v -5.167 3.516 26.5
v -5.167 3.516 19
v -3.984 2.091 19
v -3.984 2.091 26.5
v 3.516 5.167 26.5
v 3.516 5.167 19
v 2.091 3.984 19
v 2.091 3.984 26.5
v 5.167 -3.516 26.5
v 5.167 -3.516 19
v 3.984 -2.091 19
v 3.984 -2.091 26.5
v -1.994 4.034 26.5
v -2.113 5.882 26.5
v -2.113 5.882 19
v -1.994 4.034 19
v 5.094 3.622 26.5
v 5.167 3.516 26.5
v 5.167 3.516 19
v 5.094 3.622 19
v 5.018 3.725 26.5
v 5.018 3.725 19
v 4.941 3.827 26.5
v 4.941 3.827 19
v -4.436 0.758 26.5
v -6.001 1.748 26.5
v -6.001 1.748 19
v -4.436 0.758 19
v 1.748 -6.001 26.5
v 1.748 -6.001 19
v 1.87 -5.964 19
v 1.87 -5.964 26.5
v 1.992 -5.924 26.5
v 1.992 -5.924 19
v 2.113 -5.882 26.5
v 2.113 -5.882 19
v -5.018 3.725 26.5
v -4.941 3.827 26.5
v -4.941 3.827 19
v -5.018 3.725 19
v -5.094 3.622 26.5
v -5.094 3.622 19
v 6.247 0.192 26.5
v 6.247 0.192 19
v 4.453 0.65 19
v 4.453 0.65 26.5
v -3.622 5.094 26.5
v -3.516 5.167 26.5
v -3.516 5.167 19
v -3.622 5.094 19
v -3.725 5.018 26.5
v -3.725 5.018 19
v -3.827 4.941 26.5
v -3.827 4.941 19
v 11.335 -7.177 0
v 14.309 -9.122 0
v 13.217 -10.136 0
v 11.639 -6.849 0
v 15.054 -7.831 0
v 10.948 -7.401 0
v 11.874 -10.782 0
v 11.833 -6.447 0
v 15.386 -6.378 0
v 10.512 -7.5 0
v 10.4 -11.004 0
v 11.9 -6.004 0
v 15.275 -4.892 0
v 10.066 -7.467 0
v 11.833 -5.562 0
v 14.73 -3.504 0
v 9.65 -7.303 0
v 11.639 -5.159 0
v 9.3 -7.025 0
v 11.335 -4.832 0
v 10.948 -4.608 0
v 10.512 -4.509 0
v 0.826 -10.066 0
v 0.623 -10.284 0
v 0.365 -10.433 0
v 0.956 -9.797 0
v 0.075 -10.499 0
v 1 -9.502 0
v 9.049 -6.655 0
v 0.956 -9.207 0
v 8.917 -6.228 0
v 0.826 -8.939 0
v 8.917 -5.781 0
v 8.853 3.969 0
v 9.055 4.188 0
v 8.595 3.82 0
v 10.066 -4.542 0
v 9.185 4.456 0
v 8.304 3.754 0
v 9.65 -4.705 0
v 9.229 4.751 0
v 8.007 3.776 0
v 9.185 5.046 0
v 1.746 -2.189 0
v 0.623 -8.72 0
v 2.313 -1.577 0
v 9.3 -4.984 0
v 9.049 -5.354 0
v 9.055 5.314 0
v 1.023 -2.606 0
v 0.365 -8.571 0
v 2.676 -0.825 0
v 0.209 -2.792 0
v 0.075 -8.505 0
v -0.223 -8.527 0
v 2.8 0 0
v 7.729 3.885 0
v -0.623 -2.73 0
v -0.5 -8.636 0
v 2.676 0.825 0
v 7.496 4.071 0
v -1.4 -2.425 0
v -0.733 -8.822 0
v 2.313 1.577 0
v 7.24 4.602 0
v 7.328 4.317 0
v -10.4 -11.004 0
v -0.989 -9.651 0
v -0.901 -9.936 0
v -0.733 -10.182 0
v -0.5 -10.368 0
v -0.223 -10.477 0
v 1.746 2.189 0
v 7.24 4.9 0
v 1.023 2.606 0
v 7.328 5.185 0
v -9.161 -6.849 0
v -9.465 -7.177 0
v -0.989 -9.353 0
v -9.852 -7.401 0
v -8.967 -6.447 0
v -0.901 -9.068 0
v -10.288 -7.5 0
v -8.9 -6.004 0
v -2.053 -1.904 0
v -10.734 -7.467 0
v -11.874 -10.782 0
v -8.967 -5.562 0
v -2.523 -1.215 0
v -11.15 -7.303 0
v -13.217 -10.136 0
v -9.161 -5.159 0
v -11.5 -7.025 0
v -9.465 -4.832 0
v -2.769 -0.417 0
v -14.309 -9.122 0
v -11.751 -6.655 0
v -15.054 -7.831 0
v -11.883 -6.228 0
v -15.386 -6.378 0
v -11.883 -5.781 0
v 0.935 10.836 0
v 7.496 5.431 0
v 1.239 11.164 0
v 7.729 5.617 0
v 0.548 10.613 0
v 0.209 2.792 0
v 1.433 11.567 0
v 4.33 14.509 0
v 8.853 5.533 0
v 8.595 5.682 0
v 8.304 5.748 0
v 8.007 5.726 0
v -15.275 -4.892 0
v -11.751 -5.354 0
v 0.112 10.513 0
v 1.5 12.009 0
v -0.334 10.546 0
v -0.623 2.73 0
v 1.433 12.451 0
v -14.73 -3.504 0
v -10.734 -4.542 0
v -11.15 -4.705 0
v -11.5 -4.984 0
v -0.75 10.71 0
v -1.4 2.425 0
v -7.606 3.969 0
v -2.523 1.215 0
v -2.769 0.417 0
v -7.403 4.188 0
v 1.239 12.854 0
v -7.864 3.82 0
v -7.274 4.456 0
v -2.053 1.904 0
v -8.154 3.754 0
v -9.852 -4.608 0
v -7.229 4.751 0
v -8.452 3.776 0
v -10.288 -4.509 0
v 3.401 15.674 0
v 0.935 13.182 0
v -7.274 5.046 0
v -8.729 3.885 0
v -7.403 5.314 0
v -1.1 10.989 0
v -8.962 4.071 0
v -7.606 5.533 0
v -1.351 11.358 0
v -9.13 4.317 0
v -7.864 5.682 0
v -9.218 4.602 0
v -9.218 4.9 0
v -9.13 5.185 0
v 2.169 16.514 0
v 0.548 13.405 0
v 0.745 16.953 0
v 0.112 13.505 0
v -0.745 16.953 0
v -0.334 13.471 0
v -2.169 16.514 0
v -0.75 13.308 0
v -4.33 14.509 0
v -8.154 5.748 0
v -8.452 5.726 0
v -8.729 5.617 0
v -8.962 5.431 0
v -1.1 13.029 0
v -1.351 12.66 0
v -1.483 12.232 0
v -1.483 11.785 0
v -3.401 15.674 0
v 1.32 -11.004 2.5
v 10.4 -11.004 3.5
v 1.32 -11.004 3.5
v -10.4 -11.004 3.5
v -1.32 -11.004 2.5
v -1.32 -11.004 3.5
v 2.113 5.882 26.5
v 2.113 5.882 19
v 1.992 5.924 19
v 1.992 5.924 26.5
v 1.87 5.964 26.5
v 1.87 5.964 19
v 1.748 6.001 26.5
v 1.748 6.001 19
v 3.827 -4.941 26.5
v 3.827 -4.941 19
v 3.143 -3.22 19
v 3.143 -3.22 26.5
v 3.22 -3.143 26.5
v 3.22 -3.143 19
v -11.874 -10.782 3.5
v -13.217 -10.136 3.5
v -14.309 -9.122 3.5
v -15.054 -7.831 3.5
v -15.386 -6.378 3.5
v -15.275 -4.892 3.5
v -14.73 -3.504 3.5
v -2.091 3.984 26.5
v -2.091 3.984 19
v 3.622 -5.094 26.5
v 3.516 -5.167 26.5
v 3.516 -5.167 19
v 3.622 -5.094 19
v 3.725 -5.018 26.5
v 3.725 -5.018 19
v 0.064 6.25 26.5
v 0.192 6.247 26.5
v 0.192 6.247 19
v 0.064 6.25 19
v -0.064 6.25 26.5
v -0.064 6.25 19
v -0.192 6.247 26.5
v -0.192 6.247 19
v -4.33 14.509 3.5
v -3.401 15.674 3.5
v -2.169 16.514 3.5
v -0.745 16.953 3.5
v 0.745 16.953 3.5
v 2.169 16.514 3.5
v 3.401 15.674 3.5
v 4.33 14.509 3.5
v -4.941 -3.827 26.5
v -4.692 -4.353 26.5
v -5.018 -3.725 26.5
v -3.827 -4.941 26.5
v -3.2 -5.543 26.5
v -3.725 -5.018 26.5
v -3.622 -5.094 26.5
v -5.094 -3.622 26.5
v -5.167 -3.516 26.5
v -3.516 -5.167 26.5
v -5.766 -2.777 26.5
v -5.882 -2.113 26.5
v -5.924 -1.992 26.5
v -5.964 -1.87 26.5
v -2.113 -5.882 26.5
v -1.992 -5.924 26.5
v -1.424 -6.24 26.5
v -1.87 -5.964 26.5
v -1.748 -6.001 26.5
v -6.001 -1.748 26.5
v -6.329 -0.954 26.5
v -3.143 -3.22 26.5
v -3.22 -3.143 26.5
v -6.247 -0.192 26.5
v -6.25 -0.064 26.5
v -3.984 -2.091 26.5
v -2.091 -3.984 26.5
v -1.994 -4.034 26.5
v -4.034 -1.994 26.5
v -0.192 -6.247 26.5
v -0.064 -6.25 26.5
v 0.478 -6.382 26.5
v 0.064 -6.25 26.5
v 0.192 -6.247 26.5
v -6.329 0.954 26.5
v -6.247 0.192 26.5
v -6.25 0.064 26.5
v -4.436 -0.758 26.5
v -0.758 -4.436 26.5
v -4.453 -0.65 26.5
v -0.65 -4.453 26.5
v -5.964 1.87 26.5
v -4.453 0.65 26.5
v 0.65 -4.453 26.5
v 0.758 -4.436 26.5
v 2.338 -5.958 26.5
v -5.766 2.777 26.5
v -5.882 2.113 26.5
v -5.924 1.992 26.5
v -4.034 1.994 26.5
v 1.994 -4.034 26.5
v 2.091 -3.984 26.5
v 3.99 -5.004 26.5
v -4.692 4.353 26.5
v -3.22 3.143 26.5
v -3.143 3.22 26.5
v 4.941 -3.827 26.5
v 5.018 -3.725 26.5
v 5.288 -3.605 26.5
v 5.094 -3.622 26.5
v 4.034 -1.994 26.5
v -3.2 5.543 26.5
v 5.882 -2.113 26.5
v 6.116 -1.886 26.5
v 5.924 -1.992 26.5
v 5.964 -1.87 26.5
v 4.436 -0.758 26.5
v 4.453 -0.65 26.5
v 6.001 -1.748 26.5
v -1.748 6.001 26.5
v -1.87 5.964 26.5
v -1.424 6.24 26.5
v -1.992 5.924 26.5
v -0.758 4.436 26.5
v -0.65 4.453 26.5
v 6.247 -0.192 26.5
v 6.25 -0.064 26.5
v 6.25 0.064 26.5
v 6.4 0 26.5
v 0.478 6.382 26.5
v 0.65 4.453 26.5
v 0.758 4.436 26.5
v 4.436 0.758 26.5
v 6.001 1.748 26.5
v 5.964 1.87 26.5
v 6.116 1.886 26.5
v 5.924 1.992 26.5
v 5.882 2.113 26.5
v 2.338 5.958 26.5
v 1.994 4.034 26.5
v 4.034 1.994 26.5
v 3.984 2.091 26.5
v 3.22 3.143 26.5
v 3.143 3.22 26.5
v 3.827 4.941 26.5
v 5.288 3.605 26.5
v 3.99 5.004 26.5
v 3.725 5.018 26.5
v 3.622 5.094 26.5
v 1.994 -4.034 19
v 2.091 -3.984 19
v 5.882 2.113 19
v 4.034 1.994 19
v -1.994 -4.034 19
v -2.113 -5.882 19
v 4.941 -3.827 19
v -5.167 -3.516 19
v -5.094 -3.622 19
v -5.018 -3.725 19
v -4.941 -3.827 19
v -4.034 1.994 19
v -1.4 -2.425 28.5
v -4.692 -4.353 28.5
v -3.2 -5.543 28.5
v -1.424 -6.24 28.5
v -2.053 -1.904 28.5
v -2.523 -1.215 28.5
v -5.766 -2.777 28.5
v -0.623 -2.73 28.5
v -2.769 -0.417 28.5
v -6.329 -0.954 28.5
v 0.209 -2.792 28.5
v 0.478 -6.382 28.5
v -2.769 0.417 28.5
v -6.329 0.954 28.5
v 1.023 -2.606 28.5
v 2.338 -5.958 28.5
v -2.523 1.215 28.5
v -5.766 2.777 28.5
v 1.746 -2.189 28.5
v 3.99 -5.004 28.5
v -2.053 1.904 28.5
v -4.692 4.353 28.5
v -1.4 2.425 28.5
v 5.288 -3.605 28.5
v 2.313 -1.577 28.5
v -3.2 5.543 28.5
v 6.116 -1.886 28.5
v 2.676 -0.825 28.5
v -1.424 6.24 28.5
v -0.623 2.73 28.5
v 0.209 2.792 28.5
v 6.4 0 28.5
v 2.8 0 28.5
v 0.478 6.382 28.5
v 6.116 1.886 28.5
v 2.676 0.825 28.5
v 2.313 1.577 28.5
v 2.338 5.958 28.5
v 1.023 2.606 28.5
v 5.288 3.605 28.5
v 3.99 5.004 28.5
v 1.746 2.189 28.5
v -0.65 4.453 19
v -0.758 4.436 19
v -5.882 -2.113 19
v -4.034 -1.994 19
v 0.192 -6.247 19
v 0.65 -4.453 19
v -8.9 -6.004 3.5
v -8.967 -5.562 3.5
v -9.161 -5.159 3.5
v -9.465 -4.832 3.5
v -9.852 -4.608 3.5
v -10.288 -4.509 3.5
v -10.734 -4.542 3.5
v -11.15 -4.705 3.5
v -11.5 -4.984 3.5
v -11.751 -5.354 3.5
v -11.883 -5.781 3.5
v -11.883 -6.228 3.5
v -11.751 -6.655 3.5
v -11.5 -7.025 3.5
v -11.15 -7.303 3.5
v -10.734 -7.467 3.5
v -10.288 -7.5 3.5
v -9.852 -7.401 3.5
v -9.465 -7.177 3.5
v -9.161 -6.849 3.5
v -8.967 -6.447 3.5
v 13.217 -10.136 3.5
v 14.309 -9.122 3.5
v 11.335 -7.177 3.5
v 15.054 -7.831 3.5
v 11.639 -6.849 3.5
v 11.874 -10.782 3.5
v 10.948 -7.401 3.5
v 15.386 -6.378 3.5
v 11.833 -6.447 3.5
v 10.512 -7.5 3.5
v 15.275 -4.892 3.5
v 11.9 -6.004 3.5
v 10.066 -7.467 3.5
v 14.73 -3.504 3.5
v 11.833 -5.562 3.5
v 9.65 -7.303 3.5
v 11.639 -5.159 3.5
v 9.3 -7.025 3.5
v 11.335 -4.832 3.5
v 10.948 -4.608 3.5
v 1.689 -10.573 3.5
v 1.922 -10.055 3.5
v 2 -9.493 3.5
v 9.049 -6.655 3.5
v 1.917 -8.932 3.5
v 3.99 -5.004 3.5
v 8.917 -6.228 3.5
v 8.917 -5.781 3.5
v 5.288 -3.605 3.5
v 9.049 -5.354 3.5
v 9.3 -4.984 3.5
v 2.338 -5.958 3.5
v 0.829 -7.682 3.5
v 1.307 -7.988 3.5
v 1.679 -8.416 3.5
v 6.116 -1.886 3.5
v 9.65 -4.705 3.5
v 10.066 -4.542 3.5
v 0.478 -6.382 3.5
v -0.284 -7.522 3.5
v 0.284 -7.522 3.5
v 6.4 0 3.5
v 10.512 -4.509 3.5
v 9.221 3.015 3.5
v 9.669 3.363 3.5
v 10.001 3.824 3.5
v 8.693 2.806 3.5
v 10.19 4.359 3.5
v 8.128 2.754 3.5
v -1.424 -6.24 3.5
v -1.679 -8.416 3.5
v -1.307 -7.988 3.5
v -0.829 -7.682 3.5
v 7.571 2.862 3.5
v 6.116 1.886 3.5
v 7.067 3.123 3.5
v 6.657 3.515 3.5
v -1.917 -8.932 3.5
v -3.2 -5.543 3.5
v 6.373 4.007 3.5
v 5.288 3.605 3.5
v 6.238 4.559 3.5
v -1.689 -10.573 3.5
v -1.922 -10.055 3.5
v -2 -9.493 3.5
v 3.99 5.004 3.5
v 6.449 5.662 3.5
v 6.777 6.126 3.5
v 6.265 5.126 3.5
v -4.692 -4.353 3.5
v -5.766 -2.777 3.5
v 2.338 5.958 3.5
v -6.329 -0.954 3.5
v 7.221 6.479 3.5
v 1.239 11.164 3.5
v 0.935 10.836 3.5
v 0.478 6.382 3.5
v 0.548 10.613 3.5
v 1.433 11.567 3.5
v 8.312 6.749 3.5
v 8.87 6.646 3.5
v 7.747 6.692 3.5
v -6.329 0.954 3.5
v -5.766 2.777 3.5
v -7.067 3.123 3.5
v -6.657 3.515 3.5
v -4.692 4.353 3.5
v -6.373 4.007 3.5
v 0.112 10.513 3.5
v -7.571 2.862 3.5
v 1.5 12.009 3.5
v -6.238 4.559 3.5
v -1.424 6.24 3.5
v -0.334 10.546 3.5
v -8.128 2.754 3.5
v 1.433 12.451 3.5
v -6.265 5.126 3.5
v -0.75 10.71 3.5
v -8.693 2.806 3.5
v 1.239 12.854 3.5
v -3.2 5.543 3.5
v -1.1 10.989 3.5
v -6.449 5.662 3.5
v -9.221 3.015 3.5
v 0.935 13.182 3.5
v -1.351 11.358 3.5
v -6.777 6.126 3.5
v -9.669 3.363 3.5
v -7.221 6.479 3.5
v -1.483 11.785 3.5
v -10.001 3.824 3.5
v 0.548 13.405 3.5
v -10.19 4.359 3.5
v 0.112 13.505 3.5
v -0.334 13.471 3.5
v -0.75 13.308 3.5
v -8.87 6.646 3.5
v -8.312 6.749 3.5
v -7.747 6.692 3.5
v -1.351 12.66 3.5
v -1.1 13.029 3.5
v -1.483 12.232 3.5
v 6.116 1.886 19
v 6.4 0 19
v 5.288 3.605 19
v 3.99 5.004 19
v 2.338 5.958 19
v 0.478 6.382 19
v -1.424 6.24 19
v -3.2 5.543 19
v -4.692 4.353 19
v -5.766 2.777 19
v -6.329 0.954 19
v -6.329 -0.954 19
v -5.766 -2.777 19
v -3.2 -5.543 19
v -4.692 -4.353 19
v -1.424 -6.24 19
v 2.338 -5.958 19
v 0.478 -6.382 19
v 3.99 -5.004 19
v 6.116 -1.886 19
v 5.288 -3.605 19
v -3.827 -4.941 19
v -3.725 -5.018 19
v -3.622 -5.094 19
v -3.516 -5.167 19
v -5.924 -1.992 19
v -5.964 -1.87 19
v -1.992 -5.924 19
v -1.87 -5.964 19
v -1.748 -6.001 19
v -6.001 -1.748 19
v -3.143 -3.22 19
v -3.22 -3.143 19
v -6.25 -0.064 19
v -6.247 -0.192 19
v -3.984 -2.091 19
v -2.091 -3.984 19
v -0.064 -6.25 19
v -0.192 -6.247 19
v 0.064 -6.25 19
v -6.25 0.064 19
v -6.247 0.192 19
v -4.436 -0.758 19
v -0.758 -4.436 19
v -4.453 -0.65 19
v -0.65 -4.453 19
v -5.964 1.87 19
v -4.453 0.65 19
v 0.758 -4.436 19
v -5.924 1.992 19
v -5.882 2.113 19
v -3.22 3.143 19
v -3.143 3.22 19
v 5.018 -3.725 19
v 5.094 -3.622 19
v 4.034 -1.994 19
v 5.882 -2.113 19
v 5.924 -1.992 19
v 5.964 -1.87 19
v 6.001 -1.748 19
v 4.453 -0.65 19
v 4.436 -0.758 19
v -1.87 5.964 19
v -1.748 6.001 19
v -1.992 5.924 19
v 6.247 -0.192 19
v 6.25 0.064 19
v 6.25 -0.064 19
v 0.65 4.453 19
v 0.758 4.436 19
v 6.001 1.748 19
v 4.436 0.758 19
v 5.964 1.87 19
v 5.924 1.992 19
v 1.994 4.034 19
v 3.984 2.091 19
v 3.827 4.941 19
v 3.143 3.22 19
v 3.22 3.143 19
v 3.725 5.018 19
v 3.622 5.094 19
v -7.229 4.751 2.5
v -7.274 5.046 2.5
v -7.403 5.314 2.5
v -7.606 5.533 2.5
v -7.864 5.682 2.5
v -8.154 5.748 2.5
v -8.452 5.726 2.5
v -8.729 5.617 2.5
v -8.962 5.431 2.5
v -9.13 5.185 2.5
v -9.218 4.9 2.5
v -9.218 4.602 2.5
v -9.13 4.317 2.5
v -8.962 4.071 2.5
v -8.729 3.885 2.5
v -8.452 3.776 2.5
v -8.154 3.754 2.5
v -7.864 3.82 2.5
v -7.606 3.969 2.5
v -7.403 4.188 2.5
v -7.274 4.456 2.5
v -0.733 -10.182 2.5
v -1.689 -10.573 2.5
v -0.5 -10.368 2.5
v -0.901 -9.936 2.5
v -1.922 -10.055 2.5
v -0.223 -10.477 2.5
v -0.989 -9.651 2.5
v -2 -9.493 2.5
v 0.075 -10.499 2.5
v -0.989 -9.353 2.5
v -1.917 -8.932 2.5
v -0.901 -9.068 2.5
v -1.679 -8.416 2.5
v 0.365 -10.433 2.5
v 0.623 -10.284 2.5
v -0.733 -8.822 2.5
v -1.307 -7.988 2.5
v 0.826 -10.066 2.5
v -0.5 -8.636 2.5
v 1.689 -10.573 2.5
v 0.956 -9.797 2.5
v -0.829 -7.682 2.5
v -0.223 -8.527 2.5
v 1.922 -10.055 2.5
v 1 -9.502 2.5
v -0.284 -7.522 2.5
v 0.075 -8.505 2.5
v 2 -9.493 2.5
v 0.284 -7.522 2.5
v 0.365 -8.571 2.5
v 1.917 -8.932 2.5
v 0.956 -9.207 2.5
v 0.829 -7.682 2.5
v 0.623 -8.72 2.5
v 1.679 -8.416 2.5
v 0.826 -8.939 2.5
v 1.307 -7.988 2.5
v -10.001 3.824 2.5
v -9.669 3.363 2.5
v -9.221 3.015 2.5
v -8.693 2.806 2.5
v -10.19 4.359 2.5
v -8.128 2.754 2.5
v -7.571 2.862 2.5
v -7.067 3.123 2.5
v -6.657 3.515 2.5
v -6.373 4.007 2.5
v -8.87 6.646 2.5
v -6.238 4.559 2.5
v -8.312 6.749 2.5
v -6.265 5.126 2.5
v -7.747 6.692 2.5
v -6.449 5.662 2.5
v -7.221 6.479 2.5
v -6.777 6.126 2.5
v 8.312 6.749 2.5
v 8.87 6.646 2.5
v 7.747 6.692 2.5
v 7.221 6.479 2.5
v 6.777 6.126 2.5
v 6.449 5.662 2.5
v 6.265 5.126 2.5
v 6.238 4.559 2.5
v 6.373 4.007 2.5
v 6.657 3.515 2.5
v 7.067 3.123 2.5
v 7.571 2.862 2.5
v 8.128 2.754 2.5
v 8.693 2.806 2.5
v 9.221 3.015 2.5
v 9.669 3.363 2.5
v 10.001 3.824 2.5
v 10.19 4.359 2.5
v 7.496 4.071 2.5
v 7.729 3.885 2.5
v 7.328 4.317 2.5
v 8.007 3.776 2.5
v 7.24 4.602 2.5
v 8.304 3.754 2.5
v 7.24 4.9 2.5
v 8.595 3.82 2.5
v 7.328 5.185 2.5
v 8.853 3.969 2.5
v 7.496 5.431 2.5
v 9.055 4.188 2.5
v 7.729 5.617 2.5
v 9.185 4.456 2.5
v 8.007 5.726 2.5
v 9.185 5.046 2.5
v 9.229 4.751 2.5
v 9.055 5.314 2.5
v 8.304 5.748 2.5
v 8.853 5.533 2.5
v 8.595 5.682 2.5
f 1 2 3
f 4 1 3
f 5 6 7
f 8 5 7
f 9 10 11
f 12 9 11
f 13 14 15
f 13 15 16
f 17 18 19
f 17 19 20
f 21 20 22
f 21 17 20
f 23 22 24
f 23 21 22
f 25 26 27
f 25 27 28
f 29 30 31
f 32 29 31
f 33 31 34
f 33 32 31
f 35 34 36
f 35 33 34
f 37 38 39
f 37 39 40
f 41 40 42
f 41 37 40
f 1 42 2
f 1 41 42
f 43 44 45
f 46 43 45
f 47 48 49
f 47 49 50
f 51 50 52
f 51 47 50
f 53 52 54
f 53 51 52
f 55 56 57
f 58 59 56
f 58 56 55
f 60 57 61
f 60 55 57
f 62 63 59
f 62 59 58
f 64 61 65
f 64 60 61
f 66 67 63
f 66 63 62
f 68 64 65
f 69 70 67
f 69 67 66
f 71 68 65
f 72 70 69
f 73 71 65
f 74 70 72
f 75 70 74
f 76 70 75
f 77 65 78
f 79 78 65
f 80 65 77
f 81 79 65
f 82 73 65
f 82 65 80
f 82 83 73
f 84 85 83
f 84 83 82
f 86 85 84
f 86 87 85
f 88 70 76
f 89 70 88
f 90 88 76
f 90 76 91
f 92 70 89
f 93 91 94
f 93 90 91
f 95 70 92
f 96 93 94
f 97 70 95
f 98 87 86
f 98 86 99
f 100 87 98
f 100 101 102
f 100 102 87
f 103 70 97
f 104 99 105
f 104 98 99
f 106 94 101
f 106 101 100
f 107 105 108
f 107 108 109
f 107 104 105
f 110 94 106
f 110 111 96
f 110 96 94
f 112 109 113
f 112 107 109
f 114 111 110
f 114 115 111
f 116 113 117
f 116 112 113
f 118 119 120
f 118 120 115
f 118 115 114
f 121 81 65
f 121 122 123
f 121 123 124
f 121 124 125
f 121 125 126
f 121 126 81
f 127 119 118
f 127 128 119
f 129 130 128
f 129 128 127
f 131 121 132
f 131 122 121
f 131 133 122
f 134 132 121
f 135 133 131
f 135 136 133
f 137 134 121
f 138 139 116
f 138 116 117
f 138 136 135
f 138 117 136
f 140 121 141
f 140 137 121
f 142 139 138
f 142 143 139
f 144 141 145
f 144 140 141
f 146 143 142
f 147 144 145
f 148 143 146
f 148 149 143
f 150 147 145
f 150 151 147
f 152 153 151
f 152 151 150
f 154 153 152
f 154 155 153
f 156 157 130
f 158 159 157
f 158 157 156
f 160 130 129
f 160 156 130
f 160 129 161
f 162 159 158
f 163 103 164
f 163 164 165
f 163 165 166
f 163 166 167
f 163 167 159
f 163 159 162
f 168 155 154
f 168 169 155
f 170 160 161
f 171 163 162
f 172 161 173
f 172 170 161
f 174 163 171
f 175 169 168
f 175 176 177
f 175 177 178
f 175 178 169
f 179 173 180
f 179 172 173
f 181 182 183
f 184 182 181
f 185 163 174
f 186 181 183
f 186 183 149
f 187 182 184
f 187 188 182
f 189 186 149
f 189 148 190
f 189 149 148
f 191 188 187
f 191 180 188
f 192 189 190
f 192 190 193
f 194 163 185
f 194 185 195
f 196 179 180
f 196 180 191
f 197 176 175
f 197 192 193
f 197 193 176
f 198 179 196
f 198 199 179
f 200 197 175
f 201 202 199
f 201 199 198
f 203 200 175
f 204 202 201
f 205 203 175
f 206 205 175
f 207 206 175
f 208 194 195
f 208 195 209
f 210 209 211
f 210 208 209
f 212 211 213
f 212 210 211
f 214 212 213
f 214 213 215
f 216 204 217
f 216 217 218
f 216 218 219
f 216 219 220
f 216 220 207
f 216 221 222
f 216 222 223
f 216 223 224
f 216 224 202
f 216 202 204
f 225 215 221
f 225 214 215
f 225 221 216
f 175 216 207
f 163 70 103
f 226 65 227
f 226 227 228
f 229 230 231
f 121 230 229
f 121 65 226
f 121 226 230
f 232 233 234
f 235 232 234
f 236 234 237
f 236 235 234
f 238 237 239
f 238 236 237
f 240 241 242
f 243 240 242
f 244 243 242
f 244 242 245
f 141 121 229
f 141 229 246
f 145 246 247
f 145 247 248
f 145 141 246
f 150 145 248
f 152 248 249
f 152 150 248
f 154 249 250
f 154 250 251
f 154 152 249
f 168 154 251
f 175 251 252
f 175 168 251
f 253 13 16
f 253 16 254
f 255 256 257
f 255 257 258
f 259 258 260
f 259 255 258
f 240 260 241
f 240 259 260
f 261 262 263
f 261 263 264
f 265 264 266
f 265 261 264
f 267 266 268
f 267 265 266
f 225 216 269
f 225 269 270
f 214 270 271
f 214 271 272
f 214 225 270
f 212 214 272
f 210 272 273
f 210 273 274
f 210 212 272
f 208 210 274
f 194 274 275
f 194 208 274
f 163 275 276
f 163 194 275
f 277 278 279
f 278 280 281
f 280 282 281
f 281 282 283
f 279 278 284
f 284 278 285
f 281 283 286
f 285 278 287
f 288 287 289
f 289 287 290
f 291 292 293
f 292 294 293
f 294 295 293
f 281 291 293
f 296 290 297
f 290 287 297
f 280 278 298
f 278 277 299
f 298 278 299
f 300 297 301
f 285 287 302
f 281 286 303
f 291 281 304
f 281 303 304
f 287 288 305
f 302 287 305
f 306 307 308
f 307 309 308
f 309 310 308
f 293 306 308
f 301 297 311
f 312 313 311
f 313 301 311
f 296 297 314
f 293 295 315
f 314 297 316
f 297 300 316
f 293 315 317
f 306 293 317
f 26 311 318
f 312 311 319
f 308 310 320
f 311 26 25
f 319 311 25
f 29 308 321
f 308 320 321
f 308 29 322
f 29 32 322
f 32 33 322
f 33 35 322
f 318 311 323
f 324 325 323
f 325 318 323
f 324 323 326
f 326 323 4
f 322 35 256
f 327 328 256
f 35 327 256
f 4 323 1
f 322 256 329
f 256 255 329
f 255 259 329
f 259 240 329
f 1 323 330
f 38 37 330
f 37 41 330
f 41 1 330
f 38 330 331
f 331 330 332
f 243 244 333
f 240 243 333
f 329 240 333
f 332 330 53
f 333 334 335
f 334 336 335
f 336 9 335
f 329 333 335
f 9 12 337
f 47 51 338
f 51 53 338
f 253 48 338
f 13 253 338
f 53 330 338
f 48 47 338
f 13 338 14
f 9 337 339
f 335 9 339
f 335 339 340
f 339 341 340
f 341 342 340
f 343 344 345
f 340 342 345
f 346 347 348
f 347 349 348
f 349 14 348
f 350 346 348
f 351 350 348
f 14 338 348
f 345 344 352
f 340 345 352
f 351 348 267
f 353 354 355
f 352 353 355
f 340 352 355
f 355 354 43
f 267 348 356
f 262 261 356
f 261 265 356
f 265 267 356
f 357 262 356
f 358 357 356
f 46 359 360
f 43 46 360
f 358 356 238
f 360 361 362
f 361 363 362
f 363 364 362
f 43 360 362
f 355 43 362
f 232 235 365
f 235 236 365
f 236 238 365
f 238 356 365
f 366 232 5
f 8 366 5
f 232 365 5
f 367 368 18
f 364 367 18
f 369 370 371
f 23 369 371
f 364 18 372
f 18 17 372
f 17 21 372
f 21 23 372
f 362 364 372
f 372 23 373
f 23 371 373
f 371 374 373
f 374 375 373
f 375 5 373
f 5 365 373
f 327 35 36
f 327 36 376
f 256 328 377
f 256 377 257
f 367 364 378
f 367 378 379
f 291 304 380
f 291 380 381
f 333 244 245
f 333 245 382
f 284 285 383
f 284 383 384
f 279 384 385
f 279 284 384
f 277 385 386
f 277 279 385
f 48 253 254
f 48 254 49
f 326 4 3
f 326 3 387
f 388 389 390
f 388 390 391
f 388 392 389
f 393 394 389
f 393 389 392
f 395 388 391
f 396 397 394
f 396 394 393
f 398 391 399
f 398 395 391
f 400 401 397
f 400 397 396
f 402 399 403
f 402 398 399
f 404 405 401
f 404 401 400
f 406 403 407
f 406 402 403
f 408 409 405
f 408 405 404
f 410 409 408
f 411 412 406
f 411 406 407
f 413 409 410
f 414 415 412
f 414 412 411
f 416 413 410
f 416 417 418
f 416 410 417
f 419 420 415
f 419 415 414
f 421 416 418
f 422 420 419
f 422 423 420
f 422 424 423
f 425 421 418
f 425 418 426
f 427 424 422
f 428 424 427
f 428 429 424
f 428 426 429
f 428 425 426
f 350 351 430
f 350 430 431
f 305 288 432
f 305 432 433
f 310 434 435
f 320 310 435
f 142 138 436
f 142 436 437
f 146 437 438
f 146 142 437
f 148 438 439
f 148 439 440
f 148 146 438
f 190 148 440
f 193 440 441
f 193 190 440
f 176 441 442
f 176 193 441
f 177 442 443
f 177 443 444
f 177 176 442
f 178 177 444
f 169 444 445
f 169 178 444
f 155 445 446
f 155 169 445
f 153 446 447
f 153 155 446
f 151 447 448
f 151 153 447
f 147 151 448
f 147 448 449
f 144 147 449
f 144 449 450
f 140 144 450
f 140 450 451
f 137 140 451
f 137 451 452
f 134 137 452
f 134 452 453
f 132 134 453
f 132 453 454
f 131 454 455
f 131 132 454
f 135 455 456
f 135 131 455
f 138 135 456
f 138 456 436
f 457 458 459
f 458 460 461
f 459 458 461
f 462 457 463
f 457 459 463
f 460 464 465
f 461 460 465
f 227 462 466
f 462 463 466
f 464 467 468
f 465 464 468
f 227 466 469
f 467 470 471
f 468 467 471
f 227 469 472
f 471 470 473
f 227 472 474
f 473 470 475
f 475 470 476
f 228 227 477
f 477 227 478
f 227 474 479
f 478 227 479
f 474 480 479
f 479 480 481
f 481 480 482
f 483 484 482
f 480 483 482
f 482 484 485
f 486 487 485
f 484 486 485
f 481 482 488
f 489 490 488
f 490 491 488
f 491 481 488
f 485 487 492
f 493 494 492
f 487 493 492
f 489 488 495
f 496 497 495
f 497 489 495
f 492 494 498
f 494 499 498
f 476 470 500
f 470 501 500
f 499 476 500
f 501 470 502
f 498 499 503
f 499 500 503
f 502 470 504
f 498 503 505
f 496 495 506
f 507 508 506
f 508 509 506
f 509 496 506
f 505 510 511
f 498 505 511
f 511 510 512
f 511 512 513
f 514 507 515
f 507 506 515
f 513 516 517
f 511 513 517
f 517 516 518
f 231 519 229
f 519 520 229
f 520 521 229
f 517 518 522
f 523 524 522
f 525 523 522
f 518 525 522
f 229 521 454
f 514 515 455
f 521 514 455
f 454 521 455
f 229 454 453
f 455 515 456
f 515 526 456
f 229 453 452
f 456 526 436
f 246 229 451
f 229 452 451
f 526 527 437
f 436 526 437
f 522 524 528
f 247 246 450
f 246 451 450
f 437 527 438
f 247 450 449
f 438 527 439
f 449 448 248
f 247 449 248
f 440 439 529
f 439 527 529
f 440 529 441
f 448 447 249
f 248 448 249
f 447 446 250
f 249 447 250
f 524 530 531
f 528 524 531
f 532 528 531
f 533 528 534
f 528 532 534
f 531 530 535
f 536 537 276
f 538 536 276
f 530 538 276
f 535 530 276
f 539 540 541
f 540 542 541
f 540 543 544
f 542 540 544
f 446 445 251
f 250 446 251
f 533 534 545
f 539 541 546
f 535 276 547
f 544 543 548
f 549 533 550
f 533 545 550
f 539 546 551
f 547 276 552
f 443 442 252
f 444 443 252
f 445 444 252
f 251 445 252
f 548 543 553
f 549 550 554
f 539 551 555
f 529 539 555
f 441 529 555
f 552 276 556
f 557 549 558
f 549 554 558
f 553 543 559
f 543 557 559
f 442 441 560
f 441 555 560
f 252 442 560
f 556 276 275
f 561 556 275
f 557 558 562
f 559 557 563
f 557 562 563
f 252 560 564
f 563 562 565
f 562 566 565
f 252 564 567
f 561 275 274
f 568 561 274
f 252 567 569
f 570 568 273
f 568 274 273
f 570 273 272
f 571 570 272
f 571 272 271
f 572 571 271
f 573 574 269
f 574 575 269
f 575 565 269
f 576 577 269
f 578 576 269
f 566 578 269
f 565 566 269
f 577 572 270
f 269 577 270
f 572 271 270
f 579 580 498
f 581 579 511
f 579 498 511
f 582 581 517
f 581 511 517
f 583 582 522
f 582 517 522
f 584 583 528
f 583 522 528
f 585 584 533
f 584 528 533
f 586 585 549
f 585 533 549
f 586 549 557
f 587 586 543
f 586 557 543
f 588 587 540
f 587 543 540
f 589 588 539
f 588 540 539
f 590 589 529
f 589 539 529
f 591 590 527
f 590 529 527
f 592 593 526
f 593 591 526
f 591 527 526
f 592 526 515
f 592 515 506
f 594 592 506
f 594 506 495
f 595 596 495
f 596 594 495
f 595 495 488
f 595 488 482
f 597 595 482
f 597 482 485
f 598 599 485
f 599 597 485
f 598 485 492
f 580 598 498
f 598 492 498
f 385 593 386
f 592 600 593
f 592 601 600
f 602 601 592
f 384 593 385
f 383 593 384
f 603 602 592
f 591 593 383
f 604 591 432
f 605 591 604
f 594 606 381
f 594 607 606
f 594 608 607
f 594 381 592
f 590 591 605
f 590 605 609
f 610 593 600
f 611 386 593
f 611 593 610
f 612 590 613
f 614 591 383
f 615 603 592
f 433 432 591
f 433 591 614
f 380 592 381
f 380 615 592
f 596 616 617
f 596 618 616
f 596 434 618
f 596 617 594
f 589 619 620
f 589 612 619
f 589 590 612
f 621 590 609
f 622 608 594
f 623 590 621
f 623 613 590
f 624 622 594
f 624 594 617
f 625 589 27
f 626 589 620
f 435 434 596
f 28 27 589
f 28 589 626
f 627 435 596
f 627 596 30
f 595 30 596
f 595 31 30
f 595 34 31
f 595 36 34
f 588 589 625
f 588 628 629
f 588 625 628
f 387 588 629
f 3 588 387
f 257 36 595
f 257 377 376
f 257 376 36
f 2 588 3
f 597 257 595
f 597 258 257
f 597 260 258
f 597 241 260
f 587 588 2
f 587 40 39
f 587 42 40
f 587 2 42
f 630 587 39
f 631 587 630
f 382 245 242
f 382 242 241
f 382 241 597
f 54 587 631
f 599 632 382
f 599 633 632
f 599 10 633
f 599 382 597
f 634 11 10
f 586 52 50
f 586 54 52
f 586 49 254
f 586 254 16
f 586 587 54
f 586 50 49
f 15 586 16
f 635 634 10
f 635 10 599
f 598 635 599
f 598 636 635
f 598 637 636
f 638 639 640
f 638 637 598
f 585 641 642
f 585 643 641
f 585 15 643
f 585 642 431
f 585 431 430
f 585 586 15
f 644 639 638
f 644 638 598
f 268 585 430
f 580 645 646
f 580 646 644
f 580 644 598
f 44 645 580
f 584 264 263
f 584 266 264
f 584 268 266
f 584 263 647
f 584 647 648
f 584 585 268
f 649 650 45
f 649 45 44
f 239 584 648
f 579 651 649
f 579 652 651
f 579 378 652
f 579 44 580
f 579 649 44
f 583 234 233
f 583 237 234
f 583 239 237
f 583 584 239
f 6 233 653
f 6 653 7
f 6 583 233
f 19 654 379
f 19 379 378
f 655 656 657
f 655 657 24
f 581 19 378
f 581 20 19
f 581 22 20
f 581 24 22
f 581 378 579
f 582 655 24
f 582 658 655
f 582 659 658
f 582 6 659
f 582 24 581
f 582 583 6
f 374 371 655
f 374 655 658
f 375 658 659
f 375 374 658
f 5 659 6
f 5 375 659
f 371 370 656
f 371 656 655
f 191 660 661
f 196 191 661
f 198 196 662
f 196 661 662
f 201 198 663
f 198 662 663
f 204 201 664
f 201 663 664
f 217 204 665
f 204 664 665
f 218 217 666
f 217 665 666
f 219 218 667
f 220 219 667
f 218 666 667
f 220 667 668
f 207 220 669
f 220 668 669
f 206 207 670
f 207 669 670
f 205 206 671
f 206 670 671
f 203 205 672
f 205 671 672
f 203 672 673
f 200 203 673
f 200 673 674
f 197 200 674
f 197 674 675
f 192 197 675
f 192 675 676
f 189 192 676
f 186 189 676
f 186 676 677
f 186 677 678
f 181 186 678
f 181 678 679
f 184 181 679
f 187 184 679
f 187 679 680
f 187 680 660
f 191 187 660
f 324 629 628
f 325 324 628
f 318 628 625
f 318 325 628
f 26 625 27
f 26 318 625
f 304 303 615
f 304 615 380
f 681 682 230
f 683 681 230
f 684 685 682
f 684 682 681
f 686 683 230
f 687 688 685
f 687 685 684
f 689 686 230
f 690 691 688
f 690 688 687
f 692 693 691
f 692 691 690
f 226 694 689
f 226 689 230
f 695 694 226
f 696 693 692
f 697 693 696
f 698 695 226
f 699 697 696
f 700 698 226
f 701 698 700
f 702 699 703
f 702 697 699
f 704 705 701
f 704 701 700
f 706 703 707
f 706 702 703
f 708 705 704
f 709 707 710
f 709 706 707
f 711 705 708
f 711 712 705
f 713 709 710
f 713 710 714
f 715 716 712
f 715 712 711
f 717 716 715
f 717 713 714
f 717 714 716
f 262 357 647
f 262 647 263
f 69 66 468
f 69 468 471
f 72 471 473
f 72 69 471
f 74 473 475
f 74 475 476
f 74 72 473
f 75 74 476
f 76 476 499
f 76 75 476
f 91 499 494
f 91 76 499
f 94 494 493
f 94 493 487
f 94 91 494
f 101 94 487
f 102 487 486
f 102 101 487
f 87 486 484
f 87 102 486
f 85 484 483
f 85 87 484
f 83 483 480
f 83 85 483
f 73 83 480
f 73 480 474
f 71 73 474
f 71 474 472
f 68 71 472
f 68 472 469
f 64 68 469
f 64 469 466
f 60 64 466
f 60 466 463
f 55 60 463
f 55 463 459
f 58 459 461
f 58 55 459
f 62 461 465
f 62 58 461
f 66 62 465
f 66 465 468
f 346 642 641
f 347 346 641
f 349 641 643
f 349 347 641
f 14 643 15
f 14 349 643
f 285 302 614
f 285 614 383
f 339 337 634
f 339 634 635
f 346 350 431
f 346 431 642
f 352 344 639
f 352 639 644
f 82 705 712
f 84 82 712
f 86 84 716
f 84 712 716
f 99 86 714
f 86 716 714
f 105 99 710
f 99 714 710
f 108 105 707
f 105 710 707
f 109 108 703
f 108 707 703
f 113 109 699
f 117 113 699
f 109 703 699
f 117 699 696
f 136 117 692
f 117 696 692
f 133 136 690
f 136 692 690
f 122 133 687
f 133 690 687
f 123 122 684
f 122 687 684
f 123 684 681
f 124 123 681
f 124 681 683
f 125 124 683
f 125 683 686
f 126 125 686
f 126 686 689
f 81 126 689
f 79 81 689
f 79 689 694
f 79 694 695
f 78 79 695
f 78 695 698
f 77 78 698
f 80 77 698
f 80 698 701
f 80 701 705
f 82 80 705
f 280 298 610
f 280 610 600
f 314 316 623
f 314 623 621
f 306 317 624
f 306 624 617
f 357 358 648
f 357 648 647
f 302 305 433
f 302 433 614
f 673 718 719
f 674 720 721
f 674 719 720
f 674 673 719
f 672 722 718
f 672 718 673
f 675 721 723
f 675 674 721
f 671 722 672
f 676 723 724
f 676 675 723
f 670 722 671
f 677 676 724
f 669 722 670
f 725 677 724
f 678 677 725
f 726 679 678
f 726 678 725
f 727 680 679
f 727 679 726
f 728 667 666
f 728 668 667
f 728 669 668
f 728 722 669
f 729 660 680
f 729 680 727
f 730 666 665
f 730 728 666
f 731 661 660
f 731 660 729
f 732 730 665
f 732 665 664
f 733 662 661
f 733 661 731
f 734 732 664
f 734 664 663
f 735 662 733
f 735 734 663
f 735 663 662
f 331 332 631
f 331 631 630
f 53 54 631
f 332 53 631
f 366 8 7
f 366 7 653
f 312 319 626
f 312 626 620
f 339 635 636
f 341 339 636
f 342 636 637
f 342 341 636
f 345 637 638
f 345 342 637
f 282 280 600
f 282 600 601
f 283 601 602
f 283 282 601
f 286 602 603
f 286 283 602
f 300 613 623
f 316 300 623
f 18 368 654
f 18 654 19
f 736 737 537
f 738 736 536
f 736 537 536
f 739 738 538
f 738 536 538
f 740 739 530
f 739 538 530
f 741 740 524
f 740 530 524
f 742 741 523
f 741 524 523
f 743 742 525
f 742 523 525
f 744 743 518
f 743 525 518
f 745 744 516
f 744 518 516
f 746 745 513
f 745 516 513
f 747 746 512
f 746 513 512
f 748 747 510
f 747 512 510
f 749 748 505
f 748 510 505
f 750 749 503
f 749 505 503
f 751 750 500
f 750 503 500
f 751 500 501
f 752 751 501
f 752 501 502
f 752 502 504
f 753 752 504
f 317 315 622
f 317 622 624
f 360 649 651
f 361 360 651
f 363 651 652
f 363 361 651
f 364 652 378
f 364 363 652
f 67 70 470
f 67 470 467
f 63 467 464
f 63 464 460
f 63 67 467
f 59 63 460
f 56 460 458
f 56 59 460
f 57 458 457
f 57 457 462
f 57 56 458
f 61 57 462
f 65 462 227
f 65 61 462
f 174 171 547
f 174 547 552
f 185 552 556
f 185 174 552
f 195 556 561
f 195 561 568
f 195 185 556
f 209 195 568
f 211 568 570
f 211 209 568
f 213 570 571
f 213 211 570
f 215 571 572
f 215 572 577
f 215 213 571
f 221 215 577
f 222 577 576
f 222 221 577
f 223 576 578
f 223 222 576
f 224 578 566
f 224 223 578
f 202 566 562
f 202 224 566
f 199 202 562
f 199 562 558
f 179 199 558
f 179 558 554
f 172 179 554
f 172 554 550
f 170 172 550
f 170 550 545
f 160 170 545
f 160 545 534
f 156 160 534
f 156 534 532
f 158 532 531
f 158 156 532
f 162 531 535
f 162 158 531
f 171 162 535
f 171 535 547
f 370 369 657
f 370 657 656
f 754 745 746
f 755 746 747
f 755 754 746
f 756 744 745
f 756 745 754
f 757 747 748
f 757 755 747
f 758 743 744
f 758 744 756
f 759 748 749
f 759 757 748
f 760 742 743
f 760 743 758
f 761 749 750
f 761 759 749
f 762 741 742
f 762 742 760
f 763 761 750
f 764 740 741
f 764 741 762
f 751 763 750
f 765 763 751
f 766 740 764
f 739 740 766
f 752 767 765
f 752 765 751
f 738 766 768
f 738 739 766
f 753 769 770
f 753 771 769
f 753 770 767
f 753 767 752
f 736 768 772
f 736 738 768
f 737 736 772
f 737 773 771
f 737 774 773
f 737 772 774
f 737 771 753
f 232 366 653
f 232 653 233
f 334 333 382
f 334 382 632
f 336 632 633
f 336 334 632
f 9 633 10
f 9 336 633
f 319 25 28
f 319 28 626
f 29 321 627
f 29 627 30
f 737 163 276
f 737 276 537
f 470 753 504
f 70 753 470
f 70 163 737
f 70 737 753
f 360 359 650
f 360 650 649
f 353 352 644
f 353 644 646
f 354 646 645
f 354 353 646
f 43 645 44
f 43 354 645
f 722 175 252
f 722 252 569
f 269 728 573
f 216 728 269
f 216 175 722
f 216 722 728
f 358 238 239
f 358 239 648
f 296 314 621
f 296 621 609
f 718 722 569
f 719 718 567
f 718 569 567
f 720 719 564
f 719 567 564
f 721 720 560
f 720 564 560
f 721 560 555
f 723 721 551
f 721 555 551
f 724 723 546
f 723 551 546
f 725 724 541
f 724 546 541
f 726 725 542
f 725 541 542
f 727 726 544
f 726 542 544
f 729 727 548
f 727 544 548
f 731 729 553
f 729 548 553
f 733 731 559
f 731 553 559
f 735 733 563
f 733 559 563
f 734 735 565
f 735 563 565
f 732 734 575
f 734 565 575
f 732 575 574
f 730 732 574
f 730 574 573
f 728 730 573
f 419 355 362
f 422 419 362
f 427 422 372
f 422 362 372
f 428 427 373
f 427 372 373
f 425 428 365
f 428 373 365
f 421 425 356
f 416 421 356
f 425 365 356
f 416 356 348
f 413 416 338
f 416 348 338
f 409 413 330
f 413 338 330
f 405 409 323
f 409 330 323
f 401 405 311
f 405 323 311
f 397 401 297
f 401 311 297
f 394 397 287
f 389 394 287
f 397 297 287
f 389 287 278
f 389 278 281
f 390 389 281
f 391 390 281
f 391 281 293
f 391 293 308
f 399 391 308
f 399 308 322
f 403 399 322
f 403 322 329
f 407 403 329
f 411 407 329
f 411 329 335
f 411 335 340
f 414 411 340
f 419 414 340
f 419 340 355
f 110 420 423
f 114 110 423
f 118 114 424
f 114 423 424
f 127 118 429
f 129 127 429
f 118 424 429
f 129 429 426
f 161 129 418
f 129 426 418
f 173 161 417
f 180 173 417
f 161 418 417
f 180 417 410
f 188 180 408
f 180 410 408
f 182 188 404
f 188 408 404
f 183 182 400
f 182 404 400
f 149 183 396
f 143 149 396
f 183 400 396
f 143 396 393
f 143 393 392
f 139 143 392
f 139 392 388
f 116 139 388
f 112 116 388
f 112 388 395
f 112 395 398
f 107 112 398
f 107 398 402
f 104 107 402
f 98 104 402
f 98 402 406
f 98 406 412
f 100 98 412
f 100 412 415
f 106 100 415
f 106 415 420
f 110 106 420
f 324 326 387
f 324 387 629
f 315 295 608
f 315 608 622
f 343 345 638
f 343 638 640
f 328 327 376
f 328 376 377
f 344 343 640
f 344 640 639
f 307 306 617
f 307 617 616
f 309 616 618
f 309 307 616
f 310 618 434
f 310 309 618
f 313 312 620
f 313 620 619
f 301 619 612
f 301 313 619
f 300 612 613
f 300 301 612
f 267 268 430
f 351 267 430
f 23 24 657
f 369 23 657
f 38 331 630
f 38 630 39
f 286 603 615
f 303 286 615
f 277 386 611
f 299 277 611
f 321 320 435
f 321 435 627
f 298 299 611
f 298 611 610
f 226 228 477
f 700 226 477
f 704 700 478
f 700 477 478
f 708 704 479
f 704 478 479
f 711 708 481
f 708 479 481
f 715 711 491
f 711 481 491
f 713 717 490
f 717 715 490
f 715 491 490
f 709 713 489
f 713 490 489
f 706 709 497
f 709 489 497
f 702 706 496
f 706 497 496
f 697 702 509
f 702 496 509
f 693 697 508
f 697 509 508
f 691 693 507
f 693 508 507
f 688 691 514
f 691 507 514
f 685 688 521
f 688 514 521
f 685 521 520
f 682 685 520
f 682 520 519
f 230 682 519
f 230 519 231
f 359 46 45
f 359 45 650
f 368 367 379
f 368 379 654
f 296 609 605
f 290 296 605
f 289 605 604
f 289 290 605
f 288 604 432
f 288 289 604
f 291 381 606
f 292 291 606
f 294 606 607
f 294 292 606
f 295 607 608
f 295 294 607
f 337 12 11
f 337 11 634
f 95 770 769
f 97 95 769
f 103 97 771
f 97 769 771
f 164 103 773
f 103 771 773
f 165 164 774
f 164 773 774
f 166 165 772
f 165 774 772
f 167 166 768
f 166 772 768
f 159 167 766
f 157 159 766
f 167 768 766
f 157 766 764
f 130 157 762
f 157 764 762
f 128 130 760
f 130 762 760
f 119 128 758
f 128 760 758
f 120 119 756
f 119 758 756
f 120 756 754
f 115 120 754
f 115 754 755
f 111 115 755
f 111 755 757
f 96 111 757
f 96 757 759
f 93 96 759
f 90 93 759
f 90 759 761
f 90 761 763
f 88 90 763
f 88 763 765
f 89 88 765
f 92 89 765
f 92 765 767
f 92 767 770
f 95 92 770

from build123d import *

# Parameters (mm, degrees)
SKETCH1_R               = 1.5
BOSS_EXTRUDE1_DEPTH     = 3.5
SKETCH2_R               = 6.4
BOSS_EXTRUDE2_DEPTH     = 25
SKETCH3_R               = 2.8
CUT_EXTRUDE1_DEPTH      = 29.5
SKETCH6_R               = 9.569614172
CUT_EXTRUDE6_DEPTH      = 7.5
SKETCH7_R               = 17.775779512
SKETCH7_R_2             = 6.25
CUT_EXTRUDE7_DEPTH      = 7.5
SKETCH8_R               = 1
CUT_EXTRUDE8_DEPTH      = 4.5
SKETCH9_R               = 2
CUT_EXTRUDE9_DEPTH      = 13
CUT_EXTRUDE9_DEPTH_BACK = 1


with BuildPart() as part:
    # Sketch1 → Boss-Extrude1 (new body)
    with BuildSketch(Plane.XY):
        with BuildLine():
            Line((-14.730127019, -3.5044428), (-4.330127019, 14.508885599))
            ThreePointArc((-4.330127019, 14.508885599), (0, 17.008885599), (4.330127019, 14.508885599))
            Line((4.330127019, 14.508885599), (14.730127019, -3.5044428))
            ThreePointArc((14.730127019, -3.5044428), (14.730127019, -8.5044428), (10.4, -11.0044428))
            Line((10.4, -11.0044428), (-10.4, -11.0044428))
            ThreePointArc((-10.4, -11.0044428), (-14.730127019, -8.5044428), (-14.730127019, -3.5044428))
        make_face()
        with Locations((0, 12.008885599)):
            Circle(SKETCH1_R, mode=Mode.SUBTRACT)
        with Locations((-10.4, -6.0044428)):
            Circle(SKETCH1_R, mode=Mode.SUBTRACT)
        with Locations((10.4, -6.0044428)):
            Circle(SKETCH1_R, mode=Mode.SUBTRACT)
    extrude(amount=BOSS_EXTRUDE1_DEPTH)

    # Sketch2 → Boss-Extrude2 (add)
    with BuildSketch(Plane.XY.offset(3.5)):
        Circle(SKETCH2_R)
    extrude(amount=BOSS_EXTRUDE2_DEPTH)

    # Sketch3 → Cut-Extrude1 (cut, through all)
    with BuildSketch(Plane.XY.offset(28.5)):
        Circle(SKETCH3_R)
    extrude(amount=-CUT_EXTRUDE1_DEPTH, mode=Mode.SUBTRACT)

    # Sketch6 → Cut-Extrude6 (cut)
    with BuildSketch(Plane.XY.offset(26.5)):
        Circle(SKETCH6_R)
        Polygon((7, 0), (4.452808103, 0.65), (4.435733208, 0.757806641), (6.657395614, 2.163118961), (4.034011116, 1.994180112), (3.984457842, 2.091433888), (5.663118961, 4.114496766), (3.220337014, 3.14315598), (3.14315598, 3.220337014), (4.114496766, 5.663118961), (2.091433888, 3.984457842), (1.994180112, 4.034011116), (2.163118961, 6.657395614), (0.757806641, 4.435733208), (0.65, 4.452808103), (0, 7), (-0.65, 4.452808103), (-0.757806641, 4.435733208), (-2.163118961, 6.657395614), (-1.994180112, 4.034011116), (-2.091433888, 3.984457842), (-4.114496766, 5.663118961), (-3.14315598, 3.220337014), (-3.220337014, 3.14315598), (-5.663118961, 4.114496766), (-3.984457842, 2.091433888), (-4.034011116, 1.994180112), (-6.657395614, 2.163118961), (-4.435733208, 0.757806641), (-4.452808103, 0.65), (-7, 0), (-4.452808103, -0.65), (-4.435733208, -0.757806641), (-6.657395614, -2.163118961), (-4.034011116, -1.994180112), (-3.984457842, -2.091433888), (-5.663118961, -4.114496766), (-3.220337014, -3.14315598), (-3.14315598, -3.220337014), (-4.114496766, -5.663118961), (-2.091433888, -3.984457842), (-1.994180112, -4.034011116), (-2.163118961, -6.657395614), (-0.757806641, -4.435733208), (-0.65, -4.452808103), (0, -7), (0.65, -4.452808103), (0.757806641, -4.435733208), (2.163118961, -6.657395614), (1.994180112, -4.034011116), (2.091433888, -3.984457842), (4.114496766, -5.663118961), (3.14315598, -3.220337014), (3.220337014, -3.14315598), (5.663118961, -4.114496766), (3.984457842, -2.091433888), (4.034011116, -1.994180112), (6.657395614, -2.163118961), (4.435733208, -0.757806641), (4.452808103, -0.65), align=None, mode=Mode.SUBTRACT)
    extrude(amount=-CUT_EXTRUDE6_DEPTH, mode=Mode.SUBTRACT)

    # Sketch7 → Cut-Extrude7 (cut)
    with BuildSketch(Plane.XY.offset(26.5)):
        Circle(SKETCH7_R)
        Circle(SKETCH7_R_2, mode=Mode.SUBTRACT)
    extrude(amount=-CUT_EXTRUDE7_DEPTH, mode=Mode.SUBTRACT)

    # Sketch8 → Cut-Extrude8 (cut, through all)
    with BuildSketch(Plane.XY.offset(3.5)):
        with Locations((8.229165125, 4.7511107)):
            Circle(SKETCH8_R)
        with Locations((0, -9.5022214)):
            Circle(SKETCH8_R)
        with Locations((-8.229165125, 4.7511107)):
            Circle(SKETCH8_R)
    extrude(amount=-CUT_EXTRUDE8_DEPTH, mode=Mode.SUBTRACT)

    # Sketch9 → Cut-Extrude9 (cut, two sides)
    with BuildSketch(Plane.XY.offset(3.5)) as cut_extrude9_sk:
        with Locations((8.229165125, 4.7511107)):
            Circle(SKETCH9_R)
        with Locations((0, -9.5022214)):
            Circle(SKETCH9_R)
        with Locations((-8.229165125, 4.7511107)):
            Circle(SKETCH9_R)
    extrude(amount=CUT_EXTRUDE9_DEPTH, mode=Mode.SUBTRACT)
    extrude(cut_extrude9_sk.sketch, amount=-CUT_EXTRUDE9_DEPTH_BACK, mode=Mode.SUBTRACT)


solid = part.part
